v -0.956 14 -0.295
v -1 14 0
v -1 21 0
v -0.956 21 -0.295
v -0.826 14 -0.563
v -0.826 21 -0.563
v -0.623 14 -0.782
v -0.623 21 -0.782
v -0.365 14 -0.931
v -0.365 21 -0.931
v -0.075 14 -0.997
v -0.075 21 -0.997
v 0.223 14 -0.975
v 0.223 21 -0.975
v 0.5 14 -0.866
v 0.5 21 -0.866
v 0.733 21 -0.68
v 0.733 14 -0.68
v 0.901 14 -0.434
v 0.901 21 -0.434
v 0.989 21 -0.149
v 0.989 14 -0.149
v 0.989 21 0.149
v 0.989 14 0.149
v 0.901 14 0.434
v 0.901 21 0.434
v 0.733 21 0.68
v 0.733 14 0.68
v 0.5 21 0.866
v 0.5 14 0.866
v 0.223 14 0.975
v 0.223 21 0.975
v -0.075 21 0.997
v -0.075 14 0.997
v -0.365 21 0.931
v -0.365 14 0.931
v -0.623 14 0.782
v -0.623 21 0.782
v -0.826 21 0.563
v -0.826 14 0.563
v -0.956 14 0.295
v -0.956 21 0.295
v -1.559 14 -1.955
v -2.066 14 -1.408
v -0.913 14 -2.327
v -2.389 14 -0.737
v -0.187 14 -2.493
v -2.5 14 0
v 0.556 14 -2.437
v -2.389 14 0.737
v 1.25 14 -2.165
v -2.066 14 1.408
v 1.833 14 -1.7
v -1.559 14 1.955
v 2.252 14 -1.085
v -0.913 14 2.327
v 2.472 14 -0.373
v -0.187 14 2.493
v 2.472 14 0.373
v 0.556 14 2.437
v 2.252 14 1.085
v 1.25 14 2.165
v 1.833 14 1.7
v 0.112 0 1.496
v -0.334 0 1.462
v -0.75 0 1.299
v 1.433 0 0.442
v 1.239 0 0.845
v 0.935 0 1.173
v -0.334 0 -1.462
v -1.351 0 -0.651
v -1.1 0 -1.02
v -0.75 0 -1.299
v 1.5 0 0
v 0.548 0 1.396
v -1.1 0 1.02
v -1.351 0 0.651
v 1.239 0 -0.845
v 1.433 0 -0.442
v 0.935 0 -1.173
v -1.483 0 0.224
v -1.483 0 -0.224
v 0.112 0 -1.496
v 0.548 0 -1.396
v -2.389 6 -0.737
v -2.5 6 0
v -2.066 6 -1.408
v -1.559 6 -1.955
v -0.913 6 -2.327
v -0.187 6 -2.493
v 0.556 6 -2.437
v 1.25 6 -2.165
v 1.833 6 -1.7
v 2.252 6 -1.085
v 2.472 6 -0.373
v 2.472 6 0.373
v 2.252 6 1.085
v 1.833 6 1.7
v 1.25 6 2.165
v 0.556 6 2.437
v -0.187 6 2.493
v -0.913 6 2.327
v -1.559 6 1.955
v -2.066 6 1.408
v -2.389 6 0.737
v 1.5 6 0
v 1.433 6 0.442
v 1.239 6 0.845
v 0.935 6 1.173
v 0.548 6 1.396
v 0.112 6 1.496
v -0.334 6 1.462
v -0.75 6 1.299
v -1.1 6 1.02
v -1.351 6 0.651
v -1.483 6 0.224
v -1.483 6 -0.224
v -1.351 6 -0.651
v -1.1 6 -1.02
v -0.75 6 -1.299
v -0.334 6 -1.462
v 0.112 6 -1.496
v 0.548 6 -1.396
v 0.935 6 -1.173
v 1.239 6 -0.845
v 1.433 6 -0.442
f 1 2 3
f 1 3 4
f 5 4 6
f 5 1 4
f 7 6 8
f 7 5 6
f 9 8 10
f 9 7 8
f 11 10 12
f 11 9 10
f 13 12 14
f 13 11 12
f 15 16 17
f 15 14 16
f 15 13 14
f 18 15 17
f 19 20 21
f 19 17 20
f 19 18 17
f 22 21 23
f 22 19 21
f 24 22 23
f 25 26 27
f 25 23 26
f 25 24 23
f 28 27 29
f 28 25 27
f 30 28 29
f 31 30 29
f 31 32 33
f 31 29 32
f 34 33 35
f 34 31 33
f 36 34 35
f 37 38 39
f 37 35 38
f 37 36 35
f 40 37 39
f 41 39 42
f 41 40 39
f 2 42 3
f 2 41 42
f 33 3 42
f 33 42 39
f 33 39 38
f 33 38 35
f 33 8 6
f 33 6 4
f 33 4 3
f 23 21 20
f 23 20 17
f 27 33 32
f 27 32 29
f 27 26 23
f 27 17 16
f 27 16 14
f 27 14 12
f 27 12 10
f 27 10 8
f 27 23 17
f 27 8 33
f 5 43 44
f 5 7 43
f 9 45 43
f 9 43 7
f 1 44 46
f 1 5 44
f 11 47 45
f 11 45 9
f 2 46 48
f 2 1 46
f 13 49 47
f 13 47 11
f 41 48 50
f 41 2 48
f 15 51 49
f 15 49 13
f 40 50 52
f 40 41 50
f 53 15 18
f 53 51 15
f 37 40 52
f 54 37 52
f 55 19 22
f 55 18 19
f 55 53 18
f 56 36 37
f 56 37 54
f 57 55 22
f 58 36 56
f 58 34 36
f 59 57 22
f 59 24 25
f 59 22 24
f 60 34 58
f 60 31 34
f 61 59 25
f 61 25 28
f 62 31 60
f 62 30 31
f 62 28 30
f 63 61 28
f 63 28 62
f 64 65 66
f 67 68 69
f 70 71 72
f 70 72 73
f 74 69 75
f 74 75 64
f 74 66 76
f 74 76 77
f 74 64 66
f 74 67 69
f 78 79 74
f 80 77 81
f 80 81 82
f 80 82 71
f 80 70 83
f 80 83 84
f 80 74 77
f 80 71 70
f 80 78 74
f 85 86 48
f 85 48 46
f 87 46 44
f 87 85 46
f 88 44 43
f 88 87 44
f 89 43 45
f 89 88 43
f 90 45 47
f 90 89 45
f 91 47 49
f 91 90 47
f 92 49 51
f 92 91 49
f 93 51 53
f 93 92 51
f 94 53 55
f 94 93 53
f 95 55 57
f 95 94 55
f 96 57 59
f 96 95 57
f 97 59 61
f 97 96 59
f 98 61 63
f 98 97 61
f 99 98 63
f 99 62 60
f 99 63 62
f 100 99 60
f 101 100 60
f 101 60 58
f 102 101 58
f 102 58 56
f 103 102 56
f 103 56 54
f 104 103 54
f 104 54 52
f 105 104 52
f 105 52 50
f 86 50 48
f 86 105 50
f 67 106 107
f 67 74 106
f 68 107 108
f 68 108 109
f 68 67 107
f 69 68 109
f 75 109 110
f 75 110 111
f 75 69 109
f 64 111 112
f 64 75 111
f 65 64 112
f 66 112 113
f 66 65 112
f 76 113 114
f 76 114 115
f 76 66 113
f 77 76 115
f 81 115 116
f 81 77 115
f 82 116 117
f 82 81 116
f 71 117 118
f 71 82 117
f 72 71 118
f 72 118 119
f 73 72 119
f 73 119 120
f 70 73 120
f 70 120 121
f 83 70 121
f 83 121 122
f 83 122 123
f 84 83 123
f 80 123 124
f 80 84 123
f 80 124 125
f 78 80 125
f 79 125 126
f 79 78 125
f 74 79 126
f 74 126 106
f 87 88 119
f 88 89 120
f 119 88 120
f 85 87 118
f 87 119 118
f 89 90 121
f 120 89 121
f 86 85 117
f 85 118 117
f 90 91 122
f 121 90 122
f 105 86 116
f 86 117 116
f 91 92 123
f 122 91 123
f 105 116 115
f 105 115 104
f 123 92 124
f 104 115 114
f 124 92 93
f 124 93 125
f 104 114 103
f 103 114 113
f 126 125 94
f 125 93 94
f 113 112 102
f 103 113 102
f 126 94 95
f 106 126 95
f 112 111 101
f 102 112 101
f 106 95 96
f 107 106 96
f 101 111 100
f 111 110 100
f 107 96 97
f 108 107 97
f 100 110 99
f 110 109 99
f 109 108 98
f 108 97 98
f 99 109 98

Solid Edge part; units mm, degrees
sketch "Sketch1" plane through (0, 0, 0) normal (0, -1, 0) x (1, 0, 0)
  circle A0 centre (0, 0) radius 1.5
extrude "Protrusion1" add sketch "Sketch1" against normal blind 6
sketch "Sketch2" plane through (0, 6, 0) normal (0, 1, 0) x (-1, 0, 0)
  circle A0 centre (0, 0) radius 2.5
extrude "ExtrudedProtrusion_2" add sketch "Sketch2" along normal blind 8
sketch "Sketch3" plane through (0, 14, 0) normal (0, 1, 0) x (-1, 0, 0)
  circle A0 centre (0, 0) radius 1
extrude "ExtrudedProtrusion_3" add sketch "Sketch3" along normal blind 7
